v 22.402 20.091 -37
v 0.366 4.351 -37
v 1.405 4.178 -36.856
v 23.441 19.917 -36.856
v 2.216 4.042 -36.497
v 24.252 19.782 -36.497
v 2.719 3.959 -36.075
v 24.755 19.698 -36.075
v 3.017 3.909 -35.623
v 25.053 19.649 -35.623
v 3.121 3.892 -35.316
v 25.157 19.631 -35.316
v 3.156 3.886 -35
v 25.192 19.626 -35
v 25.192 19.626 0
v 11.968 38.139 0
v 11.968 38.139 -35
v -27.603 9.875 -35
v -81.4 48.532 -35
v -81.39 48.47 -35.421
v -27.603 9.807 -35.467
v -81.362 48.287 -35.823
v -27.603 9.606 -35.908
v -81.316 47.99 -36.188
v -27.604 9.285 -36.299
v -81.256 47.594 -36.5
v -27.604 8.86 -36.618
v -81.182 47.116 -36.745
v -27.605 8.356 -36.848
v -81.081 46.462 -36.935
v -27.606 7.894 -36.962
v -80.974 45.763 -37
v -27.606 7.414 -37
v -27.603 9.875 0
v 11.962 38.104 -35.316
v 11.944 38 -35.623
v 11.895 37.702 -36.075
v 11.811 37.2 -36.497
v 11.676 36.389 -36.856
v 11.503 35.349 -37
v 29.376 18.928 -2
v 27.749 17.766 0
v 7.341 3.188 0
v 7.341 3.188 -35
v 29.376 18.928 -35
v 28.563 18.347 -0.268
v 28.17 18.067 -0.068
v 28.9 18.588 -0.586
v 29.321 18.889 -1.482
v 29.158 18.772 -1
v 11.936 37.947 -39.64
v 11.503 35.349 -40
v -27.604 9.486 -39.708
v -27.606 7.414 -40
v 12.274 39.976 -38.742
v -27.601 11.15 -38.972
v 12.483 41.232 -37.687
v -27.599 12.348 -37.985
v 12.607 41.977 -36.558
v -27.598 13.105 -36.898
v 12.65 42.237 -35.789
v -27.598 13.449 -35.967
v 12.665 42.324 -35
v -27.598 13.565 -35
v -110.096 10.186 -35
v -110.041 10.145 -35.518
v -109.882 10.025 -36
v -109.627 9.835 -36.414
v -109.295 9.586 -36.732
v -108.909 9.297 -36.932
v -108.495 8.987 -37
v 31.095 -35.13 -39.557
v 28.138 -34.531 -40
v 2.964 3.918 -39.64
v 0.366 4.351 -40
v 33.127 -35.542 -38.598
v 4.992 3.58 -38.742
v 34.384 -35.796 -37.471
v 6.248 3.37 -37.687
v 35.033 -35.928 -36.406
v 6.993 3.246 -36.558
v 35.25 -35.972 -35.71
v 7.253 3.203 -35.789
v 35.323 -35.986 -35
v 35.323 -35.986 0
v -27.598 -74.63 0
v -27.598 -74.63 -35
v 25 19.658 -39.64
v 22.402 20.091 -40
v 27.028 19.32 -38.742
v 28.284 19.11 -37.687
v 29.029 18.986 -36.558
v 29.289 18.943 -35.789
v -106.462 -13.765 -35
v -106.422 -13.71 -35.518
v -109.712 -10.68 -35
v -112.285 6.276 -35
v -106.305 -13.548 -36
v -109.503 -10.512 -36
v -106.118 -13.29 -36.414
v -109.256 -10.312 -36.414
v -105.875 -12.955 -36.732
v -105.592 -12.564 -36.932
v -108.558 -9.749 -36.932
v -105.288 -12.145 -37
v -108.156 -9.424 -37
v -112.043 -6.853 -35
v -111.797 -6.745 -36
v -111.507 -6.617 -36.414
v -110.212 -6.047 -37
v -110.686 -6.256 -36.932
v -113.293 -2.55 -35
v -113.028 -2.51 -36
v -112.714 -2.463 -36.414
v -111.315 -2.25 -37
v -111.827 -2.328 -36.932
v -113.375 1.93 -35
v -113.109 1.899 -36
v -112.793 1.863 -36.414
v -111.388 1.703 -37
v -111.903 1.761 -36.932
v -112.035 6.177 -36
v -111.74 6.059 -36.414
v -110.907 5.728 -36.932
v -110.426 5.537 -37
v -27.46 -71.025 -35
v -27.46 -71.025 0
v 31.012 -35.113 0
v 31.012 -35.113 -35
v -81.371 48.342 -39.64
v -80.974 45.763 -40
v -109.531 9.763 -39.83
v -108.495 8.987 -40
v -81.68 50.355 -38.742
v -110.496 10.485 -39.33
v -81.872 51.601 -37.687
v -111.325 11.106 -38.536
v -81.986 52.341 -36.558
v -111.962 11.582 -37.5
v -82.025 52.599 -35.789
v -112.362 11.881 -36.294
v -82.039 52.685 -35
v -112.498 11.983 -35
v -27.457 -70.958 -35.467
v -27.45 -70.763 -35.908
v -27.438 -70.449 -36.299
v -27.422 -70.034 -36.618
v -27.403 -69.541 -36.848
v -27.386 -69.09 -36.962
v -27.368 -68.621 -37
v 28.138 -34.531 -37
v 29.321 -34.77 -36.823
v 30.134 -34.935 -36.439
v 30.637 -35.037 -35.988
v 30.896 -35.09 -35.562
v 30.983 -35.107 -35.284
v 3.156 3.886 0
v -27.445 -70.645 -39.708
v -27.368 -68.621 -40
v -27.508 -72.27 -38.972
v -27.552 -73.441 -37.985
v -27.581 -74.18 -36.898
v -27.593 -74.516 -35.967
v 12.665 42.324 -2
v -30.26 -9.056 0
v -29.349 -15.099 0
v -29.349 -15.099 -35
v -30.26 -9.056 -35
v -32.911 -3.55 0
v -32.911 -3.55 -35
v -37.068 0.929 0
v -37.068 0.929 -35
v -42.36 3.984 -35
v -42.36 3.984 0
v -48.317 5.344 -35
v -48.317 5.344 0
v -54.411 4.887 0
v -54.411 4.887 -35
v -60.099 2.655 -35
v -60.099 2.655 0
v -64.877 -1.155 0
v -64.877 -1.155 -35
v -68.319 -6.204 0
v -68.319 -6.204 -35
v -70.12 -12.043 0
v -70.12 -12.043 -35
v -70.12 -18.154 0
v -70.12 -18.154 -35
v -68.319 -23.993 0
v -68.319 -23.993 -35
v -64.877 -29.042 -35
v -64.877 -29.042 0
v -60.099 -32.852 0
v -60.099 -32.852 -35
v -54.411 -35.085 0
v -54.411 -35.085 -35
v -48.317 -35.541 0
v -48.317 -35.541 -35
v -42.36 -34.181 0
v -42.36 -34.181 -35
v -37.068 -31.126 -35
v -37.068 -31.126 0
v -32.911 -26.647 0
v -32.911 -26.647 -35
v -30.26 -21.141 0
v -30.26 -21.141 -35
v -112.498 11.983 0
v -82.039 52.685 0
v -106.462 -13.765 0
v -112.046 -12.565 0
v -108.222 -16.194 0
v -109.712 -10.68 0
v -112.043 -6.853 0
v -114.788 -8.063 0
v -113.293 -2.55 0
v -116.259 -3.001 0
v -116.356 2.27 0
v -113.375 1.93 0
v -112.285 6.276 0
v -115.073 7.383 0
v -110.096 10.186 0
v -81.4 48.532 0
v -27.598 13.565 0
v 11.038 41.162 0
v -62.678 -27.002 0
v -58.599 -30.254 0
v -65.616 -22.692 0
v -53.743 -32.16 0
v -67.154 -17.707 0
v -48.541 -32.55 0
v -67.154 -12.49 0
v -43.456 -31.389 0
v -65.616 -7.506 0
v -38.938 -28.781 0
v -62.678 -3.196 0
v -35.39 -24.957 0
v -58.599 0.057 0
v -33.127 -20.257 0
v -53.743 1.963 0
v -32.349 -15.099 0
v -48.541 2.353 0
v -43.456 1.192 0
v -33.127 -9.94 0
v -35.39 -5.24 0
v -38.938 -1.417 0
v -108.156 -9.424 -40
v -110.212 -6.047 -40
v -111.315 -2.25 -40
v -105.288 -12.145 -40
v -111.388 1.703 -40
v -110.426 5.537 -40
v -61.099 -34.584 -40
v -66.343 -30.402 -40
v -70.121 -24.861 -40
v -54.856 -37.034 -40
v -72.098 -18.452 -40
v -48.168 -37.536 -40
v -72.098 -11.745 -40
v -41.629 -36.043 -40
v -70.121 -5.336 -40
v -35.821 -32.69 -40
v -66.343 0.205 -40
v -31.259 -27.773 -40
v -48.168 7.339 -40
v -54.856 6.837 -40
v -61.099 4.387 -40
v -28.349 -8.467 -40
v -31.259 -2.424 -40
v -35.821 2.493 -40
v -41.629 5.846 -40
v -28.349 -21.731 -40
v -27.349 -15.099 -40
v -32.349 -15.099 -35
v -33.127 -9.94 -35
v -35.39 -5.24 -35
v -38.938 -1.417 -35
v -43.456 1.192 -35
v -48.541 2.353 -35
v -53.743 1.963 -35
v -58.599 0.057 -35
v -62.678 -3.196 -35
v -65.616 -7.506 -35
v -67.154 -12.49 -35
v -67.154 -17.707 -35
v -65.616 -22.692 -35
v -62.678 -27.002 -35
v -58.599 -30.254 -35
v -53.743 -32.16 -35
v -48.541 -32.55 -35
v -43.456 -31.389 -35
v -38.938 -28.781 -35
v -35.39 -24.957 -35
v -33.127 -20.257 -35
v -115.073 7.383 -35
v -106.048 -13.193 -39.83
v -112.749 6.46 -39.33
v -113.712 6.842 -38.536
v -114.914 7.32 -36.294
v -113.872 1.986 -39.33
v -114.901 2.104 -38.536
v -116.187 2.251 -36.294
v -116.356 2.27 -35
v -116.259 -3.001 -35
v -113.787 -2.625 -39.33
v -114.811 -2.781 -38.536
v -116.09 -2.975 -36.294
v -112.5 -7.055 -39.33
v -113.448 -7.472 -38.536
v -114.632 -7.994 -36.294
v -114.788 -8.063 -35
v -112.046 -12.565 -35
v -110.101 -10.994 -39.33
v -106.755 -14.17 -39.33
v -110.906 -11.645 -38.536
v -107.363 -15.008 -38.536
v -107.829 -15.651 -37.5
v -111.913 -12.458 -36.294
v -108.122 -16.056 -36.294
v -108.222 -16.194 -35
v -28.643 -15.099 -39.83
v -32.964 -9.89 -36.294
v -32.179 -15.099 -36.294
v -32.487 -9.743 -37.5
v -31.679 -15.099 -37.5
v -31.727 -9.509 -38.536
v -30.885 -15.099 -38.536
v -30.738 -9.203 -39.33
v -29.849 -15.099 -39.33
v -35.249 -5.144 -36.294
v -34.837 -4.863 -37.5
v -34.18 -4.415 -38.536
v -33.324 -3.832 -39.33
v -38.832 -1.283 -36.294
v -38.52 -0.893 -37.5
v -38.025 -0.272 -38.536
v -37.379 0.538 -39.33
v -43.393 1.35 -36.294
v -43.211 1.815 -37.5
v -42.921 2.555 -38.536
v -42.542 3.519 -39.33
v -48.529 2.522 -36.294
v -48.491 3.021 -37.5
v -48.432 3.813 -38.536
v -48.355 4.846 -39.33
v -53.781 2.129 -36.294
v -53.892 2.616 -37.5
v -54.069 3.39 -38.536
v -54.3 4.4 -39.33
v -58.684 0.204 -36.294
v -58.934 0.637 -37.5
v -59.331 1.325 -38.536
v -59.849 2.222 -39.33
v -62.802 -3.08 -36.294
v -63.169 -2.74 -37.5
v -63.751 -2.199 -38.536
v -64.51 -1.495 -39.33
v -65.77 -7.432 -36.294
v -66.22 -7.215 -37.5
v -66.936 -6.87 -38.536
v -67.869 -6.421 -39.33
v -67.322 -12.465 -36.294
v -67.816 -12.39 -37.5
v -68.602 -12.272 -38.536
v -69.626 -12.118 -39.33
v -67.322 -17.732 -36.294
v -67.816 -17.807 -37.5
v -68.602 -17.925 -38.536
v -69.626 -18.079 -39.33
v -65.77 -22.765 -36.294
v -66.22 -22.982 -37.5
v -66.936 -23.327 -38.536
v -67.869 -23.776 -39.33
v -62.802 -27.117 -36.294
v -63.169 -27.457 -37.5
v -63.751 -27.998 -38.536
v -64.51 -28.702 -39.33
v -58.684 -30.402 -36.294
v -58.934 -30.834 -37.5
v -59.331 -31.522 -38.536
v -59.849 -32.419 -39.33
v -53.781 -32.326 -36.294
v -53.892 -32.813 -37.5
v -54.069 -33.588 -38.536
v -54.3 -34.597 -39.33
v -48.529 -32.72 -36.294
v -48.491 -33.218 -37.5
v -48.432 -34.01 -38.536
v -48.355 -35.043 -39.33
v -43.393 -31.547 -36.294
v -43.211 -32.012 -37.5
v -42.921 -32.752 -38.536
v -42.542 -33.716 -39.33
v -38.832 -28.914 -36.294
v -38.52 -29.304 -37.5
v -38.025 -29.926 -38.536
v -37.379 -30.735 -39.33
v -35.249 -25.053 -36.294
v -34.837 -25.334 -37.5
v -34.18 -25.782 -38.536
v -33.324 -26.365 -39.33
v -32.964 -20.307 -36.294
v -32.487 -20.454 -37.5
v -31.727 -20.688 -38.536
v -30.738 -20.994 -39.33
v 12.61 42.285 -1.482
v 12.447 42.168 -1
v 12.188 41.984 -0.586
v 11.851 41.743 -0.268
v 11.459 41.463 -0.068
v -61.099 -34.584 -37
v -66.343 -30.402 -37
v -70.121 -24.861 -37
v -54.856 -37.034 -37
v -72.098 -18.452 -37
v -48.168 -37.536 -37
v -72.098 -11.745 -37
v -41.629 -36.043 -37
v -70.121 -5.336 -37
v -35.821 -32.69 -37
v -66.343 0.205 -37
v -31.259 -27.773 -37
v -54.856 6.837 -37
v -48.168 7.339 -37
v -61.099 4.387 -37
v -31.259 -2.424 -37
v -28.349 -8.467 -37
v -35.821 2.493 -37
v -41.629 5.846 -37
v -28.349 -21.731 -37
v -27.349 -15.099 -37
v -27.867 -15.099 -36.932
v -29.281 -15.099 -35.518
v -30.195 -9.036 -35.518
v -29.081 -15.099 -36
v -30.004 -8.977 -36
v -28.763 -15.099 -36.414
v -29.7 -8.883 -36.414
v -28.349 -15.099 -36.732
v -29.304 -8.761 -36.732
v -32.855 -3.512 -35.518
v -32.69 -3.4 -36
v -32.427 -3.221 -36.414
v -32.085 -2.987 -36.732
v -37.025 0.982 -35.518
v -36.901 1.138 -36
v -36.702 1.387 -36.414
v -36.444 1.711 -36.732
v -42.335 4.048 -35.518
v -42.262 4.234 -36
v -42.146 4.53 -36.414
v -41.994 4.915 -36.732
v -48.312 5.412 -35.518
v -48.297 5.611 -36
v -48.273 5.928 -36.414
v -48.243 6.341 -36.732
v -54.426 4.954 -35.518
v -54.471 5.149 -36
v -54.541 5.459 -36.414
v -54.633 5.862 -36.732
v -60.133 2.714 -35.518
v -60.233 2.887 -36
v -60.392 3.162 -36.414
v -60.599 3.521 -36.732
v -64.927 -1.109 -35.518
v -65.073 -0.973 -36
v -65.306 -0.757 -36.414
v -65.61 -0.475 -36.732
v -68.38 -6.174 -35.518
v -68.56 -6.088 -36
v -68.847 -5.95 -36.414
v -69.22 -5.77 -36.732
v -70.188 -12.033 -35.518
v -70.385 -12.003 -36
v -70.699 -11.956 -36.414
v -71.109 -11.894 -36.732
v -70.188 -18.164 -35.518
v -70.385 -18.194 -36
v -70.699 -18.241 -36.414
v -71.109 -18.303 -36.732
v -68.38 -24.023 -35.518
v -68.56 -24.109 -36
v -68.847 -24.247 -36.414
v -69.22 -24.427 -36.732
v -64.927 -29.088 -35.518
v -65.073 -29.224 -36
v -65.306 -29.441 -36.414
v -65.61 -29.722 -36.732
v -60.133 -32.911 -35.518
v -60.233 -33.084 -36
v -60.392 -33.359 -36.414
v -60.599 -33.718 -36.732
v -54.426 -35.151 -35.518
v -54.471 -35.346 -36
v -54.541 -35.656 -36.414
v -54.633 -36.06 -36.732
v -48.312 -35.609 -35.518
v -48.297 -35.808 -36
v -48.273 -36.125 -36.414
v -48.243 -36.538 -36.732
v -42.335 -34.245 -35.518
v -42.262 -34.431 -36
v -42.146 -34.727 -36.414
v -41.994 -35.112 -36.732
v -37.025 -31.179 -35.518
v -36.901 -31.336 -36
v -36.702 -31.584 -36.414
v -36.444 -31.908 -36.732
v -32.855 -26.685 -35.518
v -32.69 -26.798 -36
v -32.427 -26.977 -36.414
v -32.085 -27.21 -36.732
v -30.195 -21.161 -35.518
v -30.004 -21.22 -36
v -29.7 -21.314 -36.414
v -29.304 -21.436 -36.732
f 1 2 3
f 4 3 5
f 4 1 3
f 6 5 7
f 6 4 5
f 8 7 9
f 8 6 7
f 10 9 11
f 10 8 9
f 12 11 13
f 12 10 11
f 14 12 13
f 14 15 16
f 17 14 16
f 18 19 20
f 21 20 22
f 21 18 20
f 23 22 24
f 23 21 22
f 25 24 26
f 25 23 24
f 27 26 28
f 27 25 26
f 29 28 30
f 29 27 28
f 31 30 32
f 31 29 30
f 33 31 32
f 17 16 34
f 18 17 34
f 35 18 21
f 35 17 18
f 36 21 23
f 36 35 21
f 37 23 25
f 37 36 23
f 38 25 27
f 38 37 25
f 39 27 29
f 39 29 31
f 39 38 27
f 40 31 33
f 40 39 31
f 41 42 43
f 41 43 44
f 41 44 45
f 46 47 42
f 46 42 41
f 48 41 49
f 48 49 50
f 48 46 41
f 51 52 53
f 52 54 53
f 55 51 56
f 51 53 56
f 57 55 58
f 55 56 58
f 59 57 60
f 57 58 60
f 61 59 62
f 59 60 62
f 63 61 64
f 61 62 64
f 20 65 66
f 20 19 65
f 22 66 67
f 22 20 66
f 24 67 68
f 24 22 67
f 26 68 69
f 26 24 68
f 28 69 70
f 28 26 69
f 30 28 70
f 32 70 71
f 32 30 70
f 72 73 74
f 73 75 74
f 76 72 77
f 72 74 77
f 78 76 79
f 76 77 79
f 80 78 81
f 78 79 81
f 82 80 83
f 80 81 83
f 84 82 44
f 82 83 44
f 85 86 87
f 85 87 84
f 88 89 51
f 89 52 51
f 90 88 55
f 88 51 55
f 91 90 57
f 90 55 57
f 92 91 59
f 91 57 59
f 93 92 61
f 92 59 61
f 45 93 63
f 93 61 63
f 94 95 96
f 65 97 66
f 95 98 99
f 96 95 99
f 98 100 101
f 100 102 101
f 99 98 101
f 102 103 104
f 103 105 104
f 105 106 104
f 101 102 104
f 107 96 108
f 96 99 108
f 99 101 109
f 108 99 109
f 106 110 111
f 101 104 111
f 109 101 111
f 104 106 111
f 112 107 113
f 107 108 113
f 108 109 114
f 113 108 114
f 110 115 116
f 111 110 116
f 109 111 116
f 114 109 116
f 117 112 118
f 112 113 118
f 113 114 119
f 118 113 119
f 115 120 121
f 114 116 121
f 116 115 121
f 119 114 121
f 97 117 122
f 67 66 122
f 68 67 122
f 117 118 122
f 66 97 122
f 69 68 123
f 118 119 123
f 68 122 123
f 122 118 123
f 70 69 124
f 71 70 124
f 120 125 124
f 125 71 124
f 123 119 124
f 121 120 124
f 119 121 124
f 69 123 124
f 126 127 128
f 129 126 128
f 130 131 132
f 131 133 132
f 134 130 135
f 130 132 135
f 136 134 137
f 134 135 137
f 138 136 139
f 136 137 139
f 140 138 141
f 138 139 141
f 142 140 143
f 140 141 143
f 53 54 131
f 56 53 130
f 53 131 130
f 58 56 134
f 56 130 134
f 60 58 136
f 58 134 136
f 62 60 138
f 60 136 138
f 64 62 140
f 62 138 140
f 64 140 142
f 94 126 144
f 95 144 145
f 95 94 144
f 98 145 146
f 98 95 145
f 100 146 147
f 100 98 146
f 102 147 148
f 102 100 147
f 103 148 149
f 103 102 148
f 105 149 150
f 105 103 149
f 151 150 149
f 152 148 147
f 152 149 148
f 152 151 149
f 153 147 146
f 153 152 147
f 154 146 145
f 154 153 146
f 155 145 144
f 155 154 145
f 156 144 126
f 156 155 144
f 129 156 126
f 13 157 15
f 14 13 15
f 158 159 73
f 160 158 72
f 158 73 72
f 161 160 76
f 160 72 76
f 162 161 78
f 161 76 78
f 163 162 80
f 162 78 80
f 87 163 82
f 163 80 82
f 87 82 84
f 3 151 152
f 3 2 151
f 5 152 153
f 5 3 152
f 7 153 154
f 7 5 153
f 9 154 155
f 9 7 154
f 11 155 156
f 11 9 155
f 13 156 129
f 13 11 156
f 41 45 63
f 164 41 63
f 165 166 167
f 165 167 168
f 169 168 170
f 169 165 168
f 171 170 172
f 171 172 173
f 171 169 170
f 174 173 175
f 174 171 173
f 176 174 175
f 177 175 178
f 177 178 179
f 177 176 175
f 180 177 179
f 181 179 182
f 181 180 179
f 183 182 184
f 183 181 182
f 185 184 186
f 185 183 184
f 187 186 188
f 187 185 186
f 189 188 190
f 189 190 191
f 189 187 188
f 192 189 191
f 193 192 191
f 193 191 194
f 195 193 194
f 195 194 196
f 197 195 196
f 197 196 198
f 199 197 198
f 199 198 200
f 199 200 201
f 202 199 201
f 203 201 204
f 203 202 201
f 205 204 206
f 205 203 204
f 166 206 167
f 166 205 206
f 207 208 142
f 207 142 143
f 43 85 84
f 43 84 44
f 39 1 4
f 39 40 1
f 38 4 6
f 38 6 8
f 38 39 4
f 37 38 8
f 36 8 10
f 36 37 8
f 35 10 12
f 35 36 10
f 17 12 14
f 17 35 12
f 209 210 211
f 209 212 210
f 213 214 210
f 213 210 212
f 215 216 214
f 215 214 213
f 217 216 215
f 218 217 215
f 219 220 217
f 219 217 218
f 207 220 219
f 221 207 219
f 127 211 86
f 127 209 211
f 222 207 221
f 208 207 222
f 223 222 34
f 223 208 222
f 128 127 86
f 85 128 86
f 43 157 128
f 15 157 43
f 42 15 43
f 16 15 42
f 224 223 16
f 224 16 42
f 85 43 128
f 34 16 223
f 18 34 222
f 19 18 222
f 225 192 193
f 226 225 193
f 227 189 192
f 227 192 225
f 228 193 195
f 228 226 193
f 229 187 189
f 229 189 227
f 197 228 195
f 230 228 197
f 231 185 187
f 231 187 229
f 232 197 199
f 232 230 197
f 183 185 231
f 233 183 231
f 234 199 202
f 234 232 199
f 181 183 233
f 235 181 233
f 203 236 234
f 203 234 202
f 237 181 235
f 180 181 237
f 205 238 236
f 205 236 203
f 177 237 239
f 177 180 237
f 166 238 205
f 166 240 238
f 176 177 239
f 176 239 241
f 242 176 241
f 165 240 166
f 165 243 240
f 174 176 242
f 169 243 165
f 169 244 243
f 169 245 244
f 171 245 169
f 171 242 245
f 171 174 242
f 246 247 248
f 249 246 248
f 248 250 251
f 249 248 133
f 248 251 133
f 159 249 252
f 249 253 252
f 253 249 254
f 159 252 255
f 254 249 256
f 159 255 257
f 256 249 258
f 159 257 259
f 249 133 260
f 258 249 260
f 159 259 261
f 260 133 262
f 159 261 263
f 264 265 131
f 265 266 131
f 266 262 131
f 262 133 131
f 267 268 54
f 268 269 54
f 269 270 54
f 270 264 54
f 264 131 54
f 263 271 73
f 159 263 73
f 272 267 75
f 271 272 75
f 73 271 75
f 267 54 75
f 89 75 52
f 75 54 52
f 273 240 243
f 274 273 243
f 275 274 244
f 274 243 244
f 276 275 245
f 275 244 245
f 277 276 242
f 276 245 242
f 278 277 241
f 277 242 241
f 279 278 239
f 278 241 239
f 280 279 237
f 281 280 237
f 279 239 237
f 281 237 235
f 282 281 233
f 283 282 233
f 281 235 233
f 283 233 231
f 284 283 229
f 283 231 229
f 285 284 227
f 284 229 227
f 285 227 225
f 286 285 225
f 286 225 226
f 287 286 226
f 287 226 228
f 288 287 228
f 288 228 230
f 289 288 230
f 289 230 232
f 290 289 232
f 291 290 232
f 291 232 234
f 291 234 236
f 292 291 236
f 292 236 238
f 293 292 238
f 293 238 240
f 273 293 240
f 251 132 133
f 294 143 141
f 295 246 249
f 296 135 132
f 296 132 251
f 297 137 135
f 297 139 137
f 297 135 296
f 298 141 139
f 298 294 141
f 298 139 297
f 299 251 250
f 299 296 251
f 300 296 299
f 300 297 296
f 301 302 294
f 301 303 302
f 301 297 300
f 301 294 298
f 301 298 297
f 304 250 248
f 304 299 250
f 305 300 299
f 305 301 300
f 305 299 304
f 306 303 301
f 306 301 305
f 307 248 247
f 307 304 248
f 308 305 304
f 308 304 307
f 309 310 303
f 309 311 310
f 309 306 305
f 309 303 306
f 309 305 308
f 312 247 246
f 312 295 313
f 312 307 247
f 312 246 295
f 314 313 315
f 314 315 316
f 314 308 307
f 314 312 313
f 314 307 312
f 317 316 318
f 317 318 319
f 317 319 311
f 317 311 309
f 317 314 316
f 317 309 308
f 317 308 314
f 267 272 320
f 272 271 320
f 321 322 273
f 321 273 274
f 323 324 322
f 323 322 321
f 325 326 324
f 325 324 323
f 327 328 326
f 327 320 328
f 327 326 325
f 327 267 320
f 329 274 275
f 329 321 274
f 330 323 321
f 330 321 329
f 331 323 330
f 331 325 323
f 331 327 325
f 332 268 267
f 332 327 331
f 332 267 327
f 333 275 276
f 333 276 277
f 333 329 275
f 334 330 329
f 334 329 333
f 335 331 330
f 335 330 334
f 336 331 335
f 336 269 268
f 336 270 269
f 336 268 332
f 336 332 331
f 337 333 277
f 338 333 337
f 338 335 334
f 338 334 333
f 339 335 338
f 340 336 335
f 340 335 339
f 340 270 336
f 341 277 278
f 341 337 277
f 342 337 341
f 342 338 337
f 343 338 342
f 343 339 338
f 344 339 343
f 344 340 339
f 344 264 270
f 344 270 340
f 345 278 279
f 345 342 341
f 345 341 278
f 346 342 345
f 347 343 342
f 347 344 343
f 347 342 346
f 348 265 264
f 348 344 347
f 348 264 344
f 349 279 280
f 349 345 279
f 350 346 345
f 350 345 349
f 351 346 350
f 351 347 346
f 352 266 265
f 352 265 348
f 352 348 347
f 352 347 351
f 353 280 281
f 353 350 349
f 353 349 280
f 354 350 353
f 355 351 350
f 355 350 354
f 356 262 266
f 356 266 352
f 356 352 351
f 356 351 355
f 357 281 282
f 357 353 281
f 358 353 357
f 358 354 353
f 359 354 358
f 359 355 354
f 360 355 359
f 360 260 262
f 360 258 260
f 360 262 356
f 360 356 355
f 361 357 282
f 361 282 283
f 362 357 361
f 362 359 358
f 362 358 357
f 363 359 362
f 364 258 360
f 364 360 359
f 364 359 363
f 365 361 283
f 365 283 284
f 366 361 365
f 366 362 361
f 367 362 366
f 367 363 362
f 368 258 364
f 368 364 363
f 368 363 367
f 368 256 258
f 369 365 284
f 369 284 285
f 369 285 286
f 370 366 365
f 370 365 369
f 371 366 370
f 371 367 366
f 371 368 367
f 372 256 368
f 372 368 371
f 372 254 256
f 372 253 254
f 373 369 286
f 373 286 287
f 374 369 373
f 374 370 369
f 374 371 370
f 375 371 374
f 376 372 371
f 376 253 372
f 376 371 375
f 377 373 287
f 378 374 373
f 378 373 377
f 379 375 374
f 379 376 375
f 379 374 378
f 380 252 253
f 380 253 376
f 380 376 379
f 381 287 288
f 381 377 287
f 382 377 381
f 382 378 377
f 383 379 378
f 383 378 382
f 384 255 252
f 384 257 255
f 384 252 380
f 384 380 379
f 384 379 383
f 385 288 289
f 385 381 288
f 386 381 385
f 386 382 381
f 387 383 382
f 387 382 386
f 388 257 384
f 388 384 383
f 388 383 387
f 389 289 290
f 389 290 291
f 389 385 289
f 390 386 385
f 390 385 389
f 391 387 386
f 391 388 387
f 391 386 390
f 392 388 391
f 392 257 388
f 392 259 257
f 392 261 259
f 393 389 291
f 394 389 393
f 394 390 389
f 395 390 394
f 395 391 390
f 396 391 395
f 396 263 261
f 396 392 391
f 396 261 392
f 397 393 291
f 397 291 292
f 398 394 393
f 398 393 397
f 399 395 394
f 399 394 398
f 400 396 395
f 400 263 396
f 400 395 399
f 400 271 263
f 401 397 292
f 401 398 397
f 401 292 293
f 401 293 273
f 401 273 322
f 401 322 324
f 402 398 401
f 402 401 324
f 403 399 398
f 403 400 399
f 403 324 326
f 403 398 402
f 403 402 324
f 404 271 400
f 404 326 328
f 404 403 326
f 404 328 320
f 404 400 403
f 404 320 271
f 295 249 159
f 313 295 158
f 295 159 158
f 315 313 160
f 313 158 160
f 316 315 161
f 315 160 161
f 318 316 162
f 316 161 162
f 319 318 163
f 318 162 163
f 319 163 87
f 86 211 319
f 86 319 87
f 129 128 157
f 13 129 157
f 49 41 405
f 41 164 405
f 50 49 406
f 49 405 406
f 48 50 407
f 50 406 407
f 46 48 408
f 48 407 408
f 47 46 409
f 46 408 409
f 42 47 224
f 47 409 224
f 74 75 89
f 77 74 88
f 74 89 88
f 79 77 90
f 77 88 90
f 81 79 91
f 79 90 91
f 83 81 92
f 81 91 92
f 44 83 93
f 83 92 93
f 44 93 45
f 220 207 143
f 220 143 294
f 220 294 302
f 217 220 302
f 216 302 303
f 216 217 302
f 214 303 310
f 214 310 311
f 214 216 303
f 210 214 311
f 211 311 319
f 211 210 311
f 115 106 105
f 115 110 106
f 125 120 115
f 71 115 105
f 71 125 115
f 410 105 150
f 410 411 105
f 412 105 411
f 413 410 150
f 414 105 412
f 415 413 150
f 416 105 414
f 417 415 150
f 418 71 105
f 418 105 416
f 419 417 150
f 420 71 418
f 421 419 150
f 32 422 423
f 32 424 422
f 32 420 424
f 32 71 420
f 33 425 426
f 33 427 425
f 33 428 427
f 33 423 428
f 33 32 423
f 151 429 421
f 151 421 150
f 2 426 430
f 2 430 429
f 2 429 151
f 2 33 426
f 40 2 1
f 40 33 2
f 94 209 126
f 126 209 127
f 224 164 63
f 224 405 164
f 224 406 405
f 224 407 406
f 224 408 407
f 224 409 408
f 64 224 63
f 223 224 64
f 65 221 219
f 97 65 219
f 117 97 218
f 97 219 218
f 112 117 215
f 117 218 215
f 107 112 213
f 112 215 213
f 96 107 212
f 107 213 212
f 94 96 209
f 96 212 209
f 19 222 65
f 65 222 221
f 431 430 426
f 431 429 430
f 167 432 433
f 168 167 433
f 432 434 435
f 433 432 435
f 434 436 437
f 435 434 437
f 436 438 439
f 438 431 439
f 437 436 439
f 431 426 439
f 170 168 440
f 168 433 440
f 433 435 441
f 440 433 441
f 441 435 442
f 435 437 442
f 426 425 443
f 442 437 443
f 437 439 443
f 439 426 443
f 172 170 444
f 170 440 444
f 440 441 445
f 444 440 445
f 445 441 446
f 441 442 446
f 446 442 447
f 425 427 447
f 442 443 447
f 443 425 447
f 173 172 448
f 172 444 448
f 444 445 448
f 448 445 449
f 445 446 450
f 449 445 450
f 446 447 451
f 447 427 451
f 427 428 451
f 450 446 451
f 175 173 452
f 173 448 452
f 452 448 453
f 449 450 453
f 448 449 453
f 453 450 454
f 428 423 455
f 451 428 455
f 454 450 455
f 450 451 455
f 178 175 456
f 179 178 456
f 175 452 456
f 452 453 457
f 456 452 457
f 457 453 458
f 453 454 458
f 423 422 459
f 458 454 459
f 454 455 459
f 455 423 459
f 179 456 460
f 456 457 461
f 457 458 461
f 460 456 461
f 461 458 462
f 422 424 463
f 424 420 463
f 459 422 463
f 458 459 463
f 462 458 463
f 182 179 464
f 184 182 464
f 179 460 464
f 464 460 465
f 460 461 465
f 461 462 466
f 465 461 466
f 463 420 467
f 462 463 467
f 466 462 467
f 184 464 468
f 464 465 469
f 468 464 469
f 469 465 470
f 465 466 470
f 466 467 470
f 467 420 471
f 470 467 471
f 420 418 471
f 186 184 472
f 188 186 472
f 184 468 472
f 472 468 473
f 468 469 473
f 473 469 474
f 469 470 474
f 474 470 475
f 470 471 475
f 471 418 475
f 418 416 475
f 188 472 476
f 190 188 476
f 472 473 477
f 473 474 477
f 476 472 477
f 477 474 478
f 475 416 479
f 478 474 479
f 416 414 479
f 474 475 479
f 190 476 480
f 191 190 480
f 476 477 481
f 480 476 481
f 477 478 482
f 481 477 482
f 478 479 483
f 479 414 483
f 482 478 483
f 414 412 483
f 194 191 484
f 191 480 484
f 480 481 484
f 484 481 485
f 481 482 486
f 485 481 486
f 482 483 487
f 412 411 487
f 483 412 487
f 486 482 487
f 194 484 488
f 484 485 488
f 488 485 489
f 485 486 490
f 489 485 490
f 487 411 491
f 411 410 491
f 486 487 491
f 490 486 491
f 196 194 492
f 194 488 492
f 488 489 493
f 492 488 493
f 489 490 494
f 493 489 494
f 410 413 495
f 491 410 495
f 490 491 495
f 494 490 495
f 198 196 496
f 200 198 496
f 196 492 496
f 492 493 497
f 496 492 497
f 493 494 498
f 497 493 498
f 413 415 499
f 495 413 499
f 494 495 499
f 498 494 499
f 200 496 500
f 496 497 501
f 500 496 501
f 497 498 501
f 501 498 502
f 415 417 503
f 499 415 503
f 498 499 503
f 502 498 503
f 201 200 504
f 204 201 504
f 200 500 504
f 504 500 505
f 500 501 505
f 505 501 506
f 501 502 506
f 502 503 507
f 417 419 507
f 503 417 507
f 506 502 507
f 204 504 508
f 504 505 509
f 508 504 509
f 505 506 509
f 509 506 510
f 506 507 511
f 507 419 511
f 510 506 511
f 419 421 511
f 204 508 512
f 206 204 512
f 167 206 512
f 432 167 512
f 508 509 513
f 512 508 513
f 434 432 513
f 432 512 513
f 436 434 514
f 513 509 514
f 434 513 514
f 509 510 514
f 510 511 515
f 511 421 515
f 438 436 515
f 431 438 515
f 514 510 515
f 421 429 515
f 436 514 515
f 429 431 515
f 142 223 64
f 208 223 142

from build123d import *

# Parameters (mm, degrees)
F1_DEPTH      = 40
F2_R          = 17.5
F3_DEPTH      = 71
F3_DEPTH_BACK = 36
F4_T          = -3
F5_R          = 2
F6_R          = 5
F7_R          = 2


with BuildPart() as f1:
    # F0 (on Top) → F1 (new body)
    with BuildSketch(Plane.XY):
        with BuildLine():
            Line((-27.5977612737, 13.564970105), (-82.0387158474, 52.6854230273))
            Line((-82.0387158474, 52.6854230273), (-112.497974617, 11.9829792529))
            ThreePointArc((-112.497974617, 11.9829792529), (-116.2588665454, -3.0005047079), (-108.2223530131, -16.1938193008))
            Line((-108.2223530131, -16.1938193008), (-27.5977612737, -74.6297745564))
            Line((-27.5977612737, -74.6297745564), (35.3226008469, -35.9862801798))
            Line((35.3226008469, -35.9862801798), (7.3407227042, 3.188352482))
            Line((7.3407227042, 3.188352482), (29.3764571995, 18.9281615252))
            Line((29.3764571995, 18.9281615252), (12.6650570628, 42.3241236648))
            Line((12.6650570628, 42.3241236648), (-27.5977612737, 13.564970105))
        make_face()
    extrude(amount=-F1_DEPTH)

    # F2 (on Top) → F3 (cut, two sides)
    with BuildSketch(Plane.XY) as f3_sk:
        with Locations((-49.8492009938, -15.0985578075)):
            Circle(F2_R)
    extrude(amount=-F3_DEPTH, mode=Mode.SUBTRACT)
    extrude(f3_sk.sketch, amount=F3_DEPTH_BACK, mode=Mode.SUBTRACT)

    # F4
    f4_openings = [f1.faces().sort_by_distance(p)[0] for p in [
        (-66.747329, -43.807571, 0),
    ]]
    offset(amount=F4_T, openings=f4_openings, kind=Kind.INTERSECTION)

    # F5
    f5_edges = [f1.edges().sort_by_distance(p)[0] for p in [
        (-95.747934, 29.358811, -37),
        (-113.29282, -2.550429, -37),
        (-66.960878, -42.394636, -37),
        (1.776075, -53.068764, -37),
        (17.083964, -15.613582, -37),
        (14.173675, 11.755743, -37),
        (18.579557, 28.882428, -37),
        (-7.817716, 24.006862, -37),
        (-54.501405, 29.203302, -37),
        (-70.349201, -15.098558, -37),
    ]]
    fillet(f5_edges, radius=F5_R)

    # F6
    f6_edges = [f1.edges().sort_by_distance(p)[0] for p in [
        (-67.910057, -45.411797, -40),
        (-116.258867, -3.000505, -40),
        (3.86242, -55.308027, -40),
        (-97.268345, 32.334201, -40),
        (21.331662, -16.398964, -40),
        (-54.818239, 33.125197, -40),
        (18.35859, 11.058257, -40),
        (-7.466352, 27.944547, -40),
        (21.020757, 30.626143, -40),
        (-67.349201, -15.098558, -40),
    ]]
    fillet(f6_edges, radius=F6_R)

    # F7
    f7_edges = [f1.edges().sort_by_distance(p)[0] for p in [
        (21.020757, 30.626143, 0),
    ]]
    fillet(f7_edges, radius=F7_R)


solid = f1.part
